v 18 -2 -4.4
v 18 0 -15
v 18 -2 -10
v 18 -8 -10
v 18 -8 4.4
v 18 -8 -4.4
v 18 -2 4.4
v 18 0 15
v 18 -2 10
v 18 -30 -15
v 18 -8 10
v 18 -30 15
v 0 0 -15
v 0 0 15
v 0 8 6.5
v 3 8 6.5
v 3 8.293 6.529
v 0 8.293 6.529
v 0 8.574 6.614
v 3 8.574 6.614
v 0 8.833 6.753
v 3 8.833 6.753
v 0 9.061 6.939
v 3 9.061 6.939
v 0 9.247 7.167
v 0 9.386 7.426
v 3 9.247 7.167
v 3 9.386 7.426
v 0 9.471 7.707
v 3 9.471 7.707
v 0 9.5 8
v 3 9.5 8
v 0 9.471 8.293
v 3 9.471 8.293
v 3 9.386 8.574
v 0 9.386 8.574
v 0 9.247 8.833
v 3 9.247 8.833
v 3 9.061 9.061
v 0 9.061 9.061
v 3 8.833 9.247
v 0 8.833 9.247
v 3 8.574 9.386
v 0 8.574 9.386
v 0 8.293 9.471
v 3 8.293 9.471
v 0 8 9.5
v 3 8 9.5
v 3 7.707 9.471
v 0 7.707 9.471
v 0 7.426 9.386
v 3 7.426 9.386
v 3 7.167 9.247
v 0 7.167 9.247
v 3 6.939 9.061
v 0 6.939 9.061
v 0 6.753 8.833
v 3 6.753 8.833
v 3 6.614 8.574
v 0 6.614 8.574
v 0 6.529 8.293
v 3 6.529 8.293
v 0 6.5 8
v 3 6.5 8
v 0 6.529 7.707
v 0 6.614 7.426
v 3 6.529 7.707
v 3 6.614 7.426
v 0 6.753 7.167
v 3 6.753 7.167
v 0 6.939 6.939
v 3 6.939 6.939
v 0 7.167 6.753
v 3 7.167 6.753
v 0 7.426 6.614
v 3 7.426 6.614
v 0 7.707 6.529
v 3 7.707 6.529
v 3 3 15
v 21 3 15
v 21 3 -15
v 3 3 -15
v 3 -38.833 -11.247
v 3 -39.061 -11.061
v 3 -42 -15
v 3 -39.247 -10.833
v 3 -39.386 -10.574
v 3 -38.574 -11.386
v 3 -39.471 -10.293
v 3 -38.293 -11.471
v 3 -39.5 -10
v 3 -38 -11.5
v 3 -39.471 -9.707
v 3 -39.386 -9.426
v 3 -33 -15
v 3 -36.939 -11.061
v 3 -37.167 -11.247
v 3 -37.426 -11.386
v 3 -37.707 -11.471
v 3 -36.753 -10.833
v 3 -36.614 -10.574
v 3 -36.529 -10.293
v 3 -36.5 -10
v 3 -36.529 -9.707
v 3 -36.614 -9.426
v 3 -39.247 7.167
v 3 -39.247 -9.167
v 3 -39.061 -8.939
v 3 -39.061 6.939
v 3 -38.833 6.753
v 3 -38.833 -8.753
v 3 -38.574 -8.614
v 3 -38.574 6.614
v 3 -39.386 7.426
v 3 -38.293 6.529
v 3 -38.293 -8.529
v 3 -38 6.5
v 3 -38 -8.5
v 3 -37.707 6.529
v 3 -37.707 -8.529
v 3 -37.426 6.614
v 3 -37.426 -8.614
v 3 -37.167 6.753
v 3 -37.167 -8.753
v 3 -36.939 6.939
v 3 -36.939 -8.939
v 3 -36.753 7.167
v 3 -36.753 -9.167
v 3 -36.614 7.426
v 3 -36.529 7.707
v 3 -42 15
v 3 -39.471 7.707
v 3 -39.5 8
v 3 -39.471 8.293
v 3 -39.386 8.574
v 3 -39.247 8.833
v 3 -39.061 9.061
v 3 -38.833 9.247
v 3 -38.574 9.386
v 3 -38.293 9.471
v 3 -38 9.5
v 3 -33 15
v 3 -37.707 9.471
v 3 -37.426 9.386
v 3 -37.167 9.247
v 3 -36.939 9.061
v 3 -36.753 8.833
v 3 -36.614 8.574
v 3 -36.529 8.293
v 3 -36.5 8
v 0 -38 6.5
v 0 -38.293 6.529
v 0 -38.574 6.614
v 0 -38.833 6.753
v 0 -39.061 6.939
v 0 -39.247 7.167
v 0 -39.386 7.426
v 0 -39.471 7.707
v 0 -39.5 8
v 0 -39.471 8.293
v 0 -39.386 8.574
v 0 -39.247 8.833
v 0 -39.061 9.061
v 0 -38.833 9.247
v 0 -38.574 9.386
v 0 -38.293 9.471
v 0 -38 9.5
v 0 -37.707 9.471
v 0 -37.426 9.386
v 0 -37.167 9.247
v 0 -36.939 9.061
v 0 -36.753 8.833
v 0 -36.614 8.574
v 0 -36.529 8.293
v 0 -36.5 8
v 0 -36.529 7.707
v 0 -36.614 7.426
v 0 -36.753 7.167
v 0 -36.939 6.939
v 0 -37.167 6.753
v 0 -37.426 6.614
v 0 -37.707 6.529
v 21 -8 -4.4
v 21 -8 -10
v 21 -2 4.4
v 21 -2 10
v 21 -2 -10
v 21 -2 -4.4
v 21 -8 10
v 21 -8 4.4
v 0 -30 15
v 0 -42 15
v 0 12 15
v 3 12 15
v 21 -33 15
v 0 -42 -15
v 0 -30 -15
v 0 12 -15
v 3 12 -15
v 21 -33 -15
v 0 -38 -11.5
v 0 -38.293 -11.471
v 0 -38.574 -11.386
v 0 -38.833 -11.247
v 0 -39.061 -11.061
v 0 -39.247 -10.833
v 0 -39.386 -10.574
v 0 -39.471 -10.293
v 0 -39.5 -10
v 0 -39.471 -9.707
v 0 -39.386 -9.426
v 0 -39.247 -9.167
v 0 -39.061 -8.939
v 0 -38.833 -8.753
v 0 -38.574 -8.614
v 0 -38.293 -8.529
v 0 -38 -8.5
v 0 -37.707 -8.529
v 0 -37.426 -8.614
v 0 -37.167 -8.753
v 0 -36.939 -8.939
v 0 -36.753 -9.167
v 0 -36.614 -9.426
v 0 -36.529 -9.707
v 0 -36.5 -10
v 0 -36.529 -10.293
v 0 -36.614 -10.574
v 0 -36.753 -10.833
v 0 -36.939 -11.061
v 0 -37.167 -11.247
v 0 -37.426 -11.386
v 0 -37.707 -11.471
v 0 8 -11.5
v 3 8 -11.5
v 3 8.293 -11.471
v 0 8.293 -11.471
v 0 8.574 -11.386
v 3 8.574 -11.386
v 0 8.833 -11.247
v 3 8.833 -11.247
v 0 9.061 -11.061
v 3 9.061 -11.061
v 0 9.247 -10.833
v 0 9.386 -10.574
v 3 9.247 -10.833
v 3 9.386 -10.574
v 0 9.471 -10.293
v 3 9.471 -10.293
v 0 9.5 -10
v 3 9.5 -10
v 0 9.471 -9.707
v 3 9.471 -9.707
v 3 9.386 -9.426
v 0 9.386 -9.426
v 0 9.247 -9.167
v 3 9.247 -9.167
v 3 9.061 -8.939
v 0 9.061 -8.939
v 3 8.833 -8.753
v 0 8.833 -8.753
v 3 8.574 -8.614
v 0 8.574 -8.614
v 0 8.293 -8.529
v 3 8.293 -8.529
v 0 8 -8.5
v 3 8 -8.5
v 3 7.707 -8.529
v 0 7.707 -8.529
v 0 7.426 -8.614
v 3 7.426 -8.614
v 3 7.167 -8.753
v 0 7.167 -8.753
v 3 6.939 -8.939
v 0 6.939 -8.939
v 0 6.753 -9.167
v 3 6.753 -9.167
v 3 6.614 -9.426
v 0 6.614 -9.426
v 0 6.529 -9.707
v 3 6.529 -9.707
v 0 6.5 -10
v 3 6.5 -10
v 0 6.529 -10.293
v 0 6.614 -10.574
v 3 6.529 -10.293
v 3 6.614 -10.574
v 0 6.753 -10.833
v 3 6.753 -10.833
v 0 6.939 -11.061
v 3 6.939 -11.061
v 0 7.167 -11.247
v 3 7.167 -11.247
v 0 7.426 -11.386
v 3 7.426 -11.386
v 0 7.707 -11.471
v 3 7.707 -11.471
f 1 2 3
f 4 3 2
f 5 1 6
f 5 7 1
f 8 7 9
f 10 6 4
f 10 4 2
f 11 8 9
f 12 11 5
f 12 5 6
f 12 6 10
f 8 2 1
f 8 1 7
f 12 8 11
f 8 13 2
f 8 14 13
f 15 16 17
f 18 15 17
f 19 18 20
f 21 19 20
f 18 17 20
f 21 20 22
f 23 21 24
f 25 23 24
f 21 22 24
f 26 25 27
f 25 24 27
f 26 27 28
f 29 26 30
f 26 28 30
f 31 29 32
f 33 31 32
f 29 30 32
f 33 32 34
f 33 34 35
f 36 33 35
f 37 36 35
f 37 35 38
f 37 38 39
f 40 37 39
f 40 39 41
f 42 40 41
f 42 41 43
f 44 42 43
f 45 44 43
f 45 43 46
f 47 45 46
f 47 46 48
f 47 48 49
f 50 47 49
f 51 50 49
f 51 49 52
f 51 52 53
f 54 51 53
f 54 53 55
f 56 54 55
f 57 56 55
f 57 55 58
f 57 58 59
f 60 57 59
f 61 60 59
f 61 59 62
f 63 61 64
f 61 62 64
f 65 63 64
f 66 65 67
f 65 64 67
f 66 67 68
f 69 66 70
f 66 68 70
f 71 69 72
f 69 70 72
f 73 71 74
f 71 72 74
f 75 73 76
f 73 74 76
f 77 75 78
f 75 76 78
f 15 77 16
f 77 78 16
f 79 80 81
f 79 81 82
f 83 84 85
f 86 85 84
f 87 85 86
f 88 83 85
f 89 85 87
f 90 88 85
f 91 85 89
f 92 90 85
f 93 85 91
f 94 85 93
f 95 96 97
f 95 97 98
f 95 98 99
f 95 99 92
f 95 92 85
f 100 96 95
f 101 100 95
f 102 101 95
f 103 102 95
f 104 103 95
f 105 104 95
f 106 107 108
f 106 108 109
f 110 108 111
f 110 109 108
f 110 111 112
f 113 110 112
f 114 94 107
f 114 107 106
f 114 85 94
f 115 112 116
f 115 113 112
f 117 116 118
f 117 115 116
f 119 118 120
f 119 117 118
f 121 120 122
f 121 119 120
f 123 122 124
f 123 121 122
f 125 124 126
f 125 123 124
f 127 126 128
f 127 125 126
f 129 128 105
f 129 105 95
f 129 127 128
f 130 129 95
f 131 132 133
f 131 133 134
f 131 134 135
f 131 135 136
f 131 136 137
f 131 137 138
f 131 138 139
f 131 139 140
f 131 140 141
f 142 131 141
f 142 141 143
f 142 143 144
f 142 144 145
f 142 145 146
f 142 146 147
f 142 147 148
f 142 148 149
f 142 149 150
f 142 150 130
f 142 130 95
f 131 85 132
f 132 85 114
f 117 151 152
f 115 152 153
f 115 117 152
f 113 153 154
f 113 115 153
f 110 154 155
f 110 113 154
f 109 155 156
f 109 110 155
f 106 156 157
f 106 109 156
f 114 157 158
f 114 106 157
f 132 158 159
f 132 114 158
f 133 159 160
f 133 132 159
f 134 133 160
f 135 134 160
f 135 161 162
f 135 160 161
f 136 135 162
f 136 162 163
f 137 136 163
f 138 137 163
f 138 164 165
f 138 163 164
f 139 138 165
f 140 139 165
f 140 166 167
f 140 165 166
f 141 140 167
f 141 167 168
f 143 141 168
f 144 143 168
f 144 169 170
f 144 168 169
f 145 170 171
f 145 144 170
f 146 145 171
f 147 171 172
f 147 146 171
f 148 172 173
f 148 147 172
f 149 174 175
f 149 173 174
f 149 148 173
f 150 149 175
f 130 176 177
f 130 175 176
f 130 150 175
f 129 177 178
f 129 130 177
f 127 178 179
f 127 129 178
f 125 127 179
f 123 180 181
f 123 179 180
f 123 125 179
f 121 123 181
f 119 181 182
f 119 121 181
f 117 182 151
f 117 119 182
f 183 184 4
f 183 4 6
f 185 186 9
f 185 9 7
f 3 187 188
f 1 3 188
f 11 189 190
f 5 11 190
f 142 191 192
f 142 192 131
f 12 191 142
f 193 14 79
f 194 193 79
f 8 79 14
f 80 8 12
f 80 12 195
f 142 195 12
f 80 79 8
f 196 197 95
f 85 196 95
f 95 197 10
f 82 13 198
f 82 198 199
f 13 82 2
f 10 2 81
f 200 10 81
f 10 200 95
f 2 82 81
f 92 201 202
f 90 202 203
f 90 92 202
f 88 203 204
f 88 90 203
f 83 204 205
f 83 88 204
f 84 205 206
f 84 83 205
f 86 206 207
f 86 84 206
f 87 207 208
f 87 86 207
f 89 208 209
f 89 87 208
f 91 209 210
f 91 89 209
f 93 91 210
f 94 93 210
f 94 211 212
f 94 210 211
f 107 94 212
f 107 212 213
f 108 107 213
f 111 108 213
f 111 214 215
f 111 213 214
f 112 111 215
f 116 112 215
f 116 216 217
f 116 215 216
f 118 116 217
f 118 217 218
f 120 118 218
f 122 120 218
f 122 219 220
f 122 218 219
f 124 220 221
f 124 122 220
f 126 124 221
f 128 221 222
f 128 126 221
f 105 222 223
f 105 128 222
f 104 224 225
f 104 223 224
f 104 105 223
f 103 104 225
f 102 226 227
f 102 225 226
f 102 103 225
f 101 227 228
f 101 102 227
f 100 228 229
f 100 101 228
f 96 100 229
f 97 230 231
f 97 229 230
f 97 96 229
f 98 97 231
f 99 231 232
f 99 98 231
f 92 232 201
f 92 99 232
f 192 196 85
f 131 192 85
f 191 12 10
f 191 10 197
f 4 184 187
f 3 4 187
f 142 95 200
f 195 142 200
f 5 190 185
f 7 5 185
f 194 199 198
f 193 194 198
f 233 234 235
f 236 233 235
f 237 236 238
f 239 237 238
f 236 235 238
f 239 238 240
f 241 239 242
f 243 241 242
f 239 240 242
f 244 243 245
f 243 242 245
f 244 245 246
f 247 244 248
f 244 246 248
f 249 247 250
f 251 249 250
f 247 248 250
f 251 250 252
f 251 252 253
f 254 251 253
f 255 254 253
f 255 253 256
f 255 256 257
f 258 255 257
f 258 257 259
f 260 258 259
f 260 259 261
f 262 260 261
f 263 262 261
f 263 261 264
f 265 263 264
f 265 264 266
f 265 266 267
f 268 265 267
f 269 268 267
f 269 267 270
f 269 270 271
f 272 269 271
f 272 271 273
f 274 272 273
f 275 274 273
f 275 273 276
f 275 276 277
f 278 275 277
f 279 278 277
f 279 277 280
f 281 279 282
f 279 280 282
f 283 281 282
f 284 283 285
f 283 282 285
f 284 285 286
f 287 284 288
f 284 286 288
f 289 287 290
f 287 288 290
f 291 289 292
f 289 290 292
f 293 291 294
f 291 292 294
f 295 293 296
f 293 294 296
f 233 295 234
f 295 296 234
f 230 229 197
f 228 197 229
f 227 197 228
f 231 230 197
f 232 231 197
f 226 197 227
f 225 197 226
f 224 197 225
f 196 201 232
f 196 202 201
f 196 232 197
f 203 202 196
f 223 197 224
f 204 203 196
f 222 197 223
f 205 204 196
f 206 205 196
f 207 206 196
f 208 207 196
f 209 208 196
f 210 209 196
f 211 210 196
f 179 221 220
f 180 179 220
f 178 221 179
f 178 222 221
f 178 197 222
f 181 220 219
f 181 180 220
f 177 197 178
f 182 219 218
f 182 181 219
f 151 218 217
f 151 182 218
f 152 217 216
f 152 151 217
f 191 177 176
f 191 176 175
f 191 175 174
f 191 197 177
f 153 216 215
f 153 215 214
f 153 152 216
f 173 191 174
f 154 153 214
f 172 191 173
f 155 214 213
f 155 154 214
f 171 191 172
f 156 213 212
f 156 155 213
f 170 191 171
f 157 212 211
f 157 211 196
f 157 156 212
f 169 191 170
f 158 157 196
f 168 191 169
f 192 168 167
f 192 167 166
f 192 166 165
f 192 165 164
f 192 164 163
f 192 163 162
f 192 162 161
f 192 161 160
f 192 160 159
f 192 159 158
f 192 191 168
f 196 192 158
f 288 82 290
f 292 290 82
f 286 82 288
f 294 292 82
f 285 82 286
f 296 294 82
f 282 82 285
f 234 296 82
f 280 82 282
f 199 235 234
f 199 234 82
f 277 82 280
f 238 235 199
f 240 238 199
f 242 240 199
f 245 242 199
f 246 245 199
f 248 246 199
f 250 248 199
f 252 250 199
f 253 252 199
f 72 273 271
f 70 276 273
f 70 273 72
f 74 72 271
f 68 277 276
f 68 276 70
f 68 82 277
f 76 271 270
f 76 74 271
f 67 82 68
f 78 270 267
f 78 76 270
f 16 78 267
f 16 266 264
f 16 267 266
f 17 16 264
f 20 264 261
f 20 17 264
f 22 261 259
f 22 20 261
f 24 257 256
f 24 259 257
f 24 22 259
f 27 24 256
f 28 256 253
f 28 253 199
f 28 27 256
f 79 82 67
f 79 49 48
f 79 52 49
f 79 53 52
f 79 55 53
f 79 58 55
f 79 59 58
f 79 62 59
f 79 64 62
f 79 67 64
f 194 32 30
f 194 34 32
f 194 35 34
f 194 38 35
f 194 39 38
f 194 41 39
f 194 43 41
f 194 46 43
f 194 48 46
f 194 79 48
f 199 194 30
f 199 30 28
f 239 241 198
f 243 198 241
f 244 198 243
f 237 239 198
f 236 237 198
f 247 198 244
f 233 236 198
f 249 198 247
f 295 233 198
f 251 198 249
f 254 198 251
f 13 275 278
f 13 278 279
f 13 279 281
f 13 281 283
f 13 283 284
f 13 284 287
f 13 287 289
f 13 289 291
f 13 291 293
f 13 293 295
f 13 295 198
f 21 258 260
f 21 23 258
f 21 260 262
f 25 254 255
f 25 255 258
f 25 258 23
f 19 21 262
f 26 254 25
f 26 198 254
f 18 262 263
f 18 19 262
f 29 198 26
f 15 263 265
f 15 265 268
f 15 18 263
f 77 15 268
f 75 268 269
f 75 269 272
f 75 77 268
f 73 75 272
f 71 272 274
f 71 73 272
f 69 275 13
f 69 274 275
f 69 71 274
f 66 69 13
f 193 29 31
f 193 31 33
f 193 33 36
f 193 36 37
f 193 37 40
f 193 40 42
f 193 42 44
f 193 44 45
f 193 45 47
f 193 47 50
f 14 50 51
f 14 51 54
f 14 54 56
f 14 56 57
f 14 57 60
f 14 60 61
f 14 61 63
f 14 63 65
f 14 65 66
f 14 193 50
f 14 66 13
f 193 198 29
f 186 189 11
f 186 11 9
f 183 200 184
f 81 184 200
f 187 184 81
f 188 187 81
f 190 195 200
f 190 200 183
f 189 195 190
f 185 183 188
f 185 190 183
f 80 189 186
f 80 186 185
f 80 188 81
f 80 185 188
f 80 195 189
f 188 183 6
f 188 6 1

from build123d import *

# Parameters (mm, degrees)
EXTRUDE_1_DEPTH     = 15
SKETCH_2_W          = 5.6
SKETCH_2_H          = 6
CUT_EXTRUDE_1_DEPTH = 20
SKETCH_3_R          = 1.5
CUT_EXTRUDE_2_DEPTH = 10


with BuildPart() as part:
    # 草图1 → 凸台-拉伸1 (new body, symmetric)
    with BuildSketch(Plane.XY):
        Polygon((0, 0), (18, 0), (18, -30), (0, -30), (0, -42), (3, -42), (3, -33), (21, -33), (21, 3), (3, 3), (3, 12), (0, 12), align=None)
    extrude(amount=EXTRUDE_1_DEPTH, both=True)

    # 草图2 → 切除-拉伸1 (cut)
    with BuildSketch(Plane(origin=(21, 0, 0), x_dir=(0, 0, -1), z_dir=(1, 0, 0))):
        with Locations((-7.2, -5)):
            Rectangle(SKETCH_2_W, SKETCH_2_H)
    cut_extrude_1 = extrude(amount=-CUT_EXTRUDE_1_DEPTH, mode=Mode.SUBTRACT)

    # 镜向1: 切除-拉伸1 across plane
    add(cut_extrude_1.mirror(Plane.XY), mode=Mode.SUBTRACT)

    # 草图3 → 切除-拉伸2 (cut)
    with BuildSketch(Plane(origin=(3, 0, 0), x_dir=(0, 0, -1), z_dir=(1, 0, 0))):
        with Locations((10, 8)):
            Circle(SKETCH_3_R)
        with Locations((-8, 8)):
            Circle(SKETCH_3_R)
    cut_extrude_2 = extrude(amount=-CUT_EXTRUDE_2_DEPTH, mode=Mode.SUBTRACT)

    # 镜向2: 切除-拉伸2 across plane
    add(cut_extrude_2.mirror(Plane(origin=(0, -15, 0), x_dir=(0, 0, 1), z_dir=(0, -1, 0))), mode=Mode.SUBTRACT)


solid = part.part
